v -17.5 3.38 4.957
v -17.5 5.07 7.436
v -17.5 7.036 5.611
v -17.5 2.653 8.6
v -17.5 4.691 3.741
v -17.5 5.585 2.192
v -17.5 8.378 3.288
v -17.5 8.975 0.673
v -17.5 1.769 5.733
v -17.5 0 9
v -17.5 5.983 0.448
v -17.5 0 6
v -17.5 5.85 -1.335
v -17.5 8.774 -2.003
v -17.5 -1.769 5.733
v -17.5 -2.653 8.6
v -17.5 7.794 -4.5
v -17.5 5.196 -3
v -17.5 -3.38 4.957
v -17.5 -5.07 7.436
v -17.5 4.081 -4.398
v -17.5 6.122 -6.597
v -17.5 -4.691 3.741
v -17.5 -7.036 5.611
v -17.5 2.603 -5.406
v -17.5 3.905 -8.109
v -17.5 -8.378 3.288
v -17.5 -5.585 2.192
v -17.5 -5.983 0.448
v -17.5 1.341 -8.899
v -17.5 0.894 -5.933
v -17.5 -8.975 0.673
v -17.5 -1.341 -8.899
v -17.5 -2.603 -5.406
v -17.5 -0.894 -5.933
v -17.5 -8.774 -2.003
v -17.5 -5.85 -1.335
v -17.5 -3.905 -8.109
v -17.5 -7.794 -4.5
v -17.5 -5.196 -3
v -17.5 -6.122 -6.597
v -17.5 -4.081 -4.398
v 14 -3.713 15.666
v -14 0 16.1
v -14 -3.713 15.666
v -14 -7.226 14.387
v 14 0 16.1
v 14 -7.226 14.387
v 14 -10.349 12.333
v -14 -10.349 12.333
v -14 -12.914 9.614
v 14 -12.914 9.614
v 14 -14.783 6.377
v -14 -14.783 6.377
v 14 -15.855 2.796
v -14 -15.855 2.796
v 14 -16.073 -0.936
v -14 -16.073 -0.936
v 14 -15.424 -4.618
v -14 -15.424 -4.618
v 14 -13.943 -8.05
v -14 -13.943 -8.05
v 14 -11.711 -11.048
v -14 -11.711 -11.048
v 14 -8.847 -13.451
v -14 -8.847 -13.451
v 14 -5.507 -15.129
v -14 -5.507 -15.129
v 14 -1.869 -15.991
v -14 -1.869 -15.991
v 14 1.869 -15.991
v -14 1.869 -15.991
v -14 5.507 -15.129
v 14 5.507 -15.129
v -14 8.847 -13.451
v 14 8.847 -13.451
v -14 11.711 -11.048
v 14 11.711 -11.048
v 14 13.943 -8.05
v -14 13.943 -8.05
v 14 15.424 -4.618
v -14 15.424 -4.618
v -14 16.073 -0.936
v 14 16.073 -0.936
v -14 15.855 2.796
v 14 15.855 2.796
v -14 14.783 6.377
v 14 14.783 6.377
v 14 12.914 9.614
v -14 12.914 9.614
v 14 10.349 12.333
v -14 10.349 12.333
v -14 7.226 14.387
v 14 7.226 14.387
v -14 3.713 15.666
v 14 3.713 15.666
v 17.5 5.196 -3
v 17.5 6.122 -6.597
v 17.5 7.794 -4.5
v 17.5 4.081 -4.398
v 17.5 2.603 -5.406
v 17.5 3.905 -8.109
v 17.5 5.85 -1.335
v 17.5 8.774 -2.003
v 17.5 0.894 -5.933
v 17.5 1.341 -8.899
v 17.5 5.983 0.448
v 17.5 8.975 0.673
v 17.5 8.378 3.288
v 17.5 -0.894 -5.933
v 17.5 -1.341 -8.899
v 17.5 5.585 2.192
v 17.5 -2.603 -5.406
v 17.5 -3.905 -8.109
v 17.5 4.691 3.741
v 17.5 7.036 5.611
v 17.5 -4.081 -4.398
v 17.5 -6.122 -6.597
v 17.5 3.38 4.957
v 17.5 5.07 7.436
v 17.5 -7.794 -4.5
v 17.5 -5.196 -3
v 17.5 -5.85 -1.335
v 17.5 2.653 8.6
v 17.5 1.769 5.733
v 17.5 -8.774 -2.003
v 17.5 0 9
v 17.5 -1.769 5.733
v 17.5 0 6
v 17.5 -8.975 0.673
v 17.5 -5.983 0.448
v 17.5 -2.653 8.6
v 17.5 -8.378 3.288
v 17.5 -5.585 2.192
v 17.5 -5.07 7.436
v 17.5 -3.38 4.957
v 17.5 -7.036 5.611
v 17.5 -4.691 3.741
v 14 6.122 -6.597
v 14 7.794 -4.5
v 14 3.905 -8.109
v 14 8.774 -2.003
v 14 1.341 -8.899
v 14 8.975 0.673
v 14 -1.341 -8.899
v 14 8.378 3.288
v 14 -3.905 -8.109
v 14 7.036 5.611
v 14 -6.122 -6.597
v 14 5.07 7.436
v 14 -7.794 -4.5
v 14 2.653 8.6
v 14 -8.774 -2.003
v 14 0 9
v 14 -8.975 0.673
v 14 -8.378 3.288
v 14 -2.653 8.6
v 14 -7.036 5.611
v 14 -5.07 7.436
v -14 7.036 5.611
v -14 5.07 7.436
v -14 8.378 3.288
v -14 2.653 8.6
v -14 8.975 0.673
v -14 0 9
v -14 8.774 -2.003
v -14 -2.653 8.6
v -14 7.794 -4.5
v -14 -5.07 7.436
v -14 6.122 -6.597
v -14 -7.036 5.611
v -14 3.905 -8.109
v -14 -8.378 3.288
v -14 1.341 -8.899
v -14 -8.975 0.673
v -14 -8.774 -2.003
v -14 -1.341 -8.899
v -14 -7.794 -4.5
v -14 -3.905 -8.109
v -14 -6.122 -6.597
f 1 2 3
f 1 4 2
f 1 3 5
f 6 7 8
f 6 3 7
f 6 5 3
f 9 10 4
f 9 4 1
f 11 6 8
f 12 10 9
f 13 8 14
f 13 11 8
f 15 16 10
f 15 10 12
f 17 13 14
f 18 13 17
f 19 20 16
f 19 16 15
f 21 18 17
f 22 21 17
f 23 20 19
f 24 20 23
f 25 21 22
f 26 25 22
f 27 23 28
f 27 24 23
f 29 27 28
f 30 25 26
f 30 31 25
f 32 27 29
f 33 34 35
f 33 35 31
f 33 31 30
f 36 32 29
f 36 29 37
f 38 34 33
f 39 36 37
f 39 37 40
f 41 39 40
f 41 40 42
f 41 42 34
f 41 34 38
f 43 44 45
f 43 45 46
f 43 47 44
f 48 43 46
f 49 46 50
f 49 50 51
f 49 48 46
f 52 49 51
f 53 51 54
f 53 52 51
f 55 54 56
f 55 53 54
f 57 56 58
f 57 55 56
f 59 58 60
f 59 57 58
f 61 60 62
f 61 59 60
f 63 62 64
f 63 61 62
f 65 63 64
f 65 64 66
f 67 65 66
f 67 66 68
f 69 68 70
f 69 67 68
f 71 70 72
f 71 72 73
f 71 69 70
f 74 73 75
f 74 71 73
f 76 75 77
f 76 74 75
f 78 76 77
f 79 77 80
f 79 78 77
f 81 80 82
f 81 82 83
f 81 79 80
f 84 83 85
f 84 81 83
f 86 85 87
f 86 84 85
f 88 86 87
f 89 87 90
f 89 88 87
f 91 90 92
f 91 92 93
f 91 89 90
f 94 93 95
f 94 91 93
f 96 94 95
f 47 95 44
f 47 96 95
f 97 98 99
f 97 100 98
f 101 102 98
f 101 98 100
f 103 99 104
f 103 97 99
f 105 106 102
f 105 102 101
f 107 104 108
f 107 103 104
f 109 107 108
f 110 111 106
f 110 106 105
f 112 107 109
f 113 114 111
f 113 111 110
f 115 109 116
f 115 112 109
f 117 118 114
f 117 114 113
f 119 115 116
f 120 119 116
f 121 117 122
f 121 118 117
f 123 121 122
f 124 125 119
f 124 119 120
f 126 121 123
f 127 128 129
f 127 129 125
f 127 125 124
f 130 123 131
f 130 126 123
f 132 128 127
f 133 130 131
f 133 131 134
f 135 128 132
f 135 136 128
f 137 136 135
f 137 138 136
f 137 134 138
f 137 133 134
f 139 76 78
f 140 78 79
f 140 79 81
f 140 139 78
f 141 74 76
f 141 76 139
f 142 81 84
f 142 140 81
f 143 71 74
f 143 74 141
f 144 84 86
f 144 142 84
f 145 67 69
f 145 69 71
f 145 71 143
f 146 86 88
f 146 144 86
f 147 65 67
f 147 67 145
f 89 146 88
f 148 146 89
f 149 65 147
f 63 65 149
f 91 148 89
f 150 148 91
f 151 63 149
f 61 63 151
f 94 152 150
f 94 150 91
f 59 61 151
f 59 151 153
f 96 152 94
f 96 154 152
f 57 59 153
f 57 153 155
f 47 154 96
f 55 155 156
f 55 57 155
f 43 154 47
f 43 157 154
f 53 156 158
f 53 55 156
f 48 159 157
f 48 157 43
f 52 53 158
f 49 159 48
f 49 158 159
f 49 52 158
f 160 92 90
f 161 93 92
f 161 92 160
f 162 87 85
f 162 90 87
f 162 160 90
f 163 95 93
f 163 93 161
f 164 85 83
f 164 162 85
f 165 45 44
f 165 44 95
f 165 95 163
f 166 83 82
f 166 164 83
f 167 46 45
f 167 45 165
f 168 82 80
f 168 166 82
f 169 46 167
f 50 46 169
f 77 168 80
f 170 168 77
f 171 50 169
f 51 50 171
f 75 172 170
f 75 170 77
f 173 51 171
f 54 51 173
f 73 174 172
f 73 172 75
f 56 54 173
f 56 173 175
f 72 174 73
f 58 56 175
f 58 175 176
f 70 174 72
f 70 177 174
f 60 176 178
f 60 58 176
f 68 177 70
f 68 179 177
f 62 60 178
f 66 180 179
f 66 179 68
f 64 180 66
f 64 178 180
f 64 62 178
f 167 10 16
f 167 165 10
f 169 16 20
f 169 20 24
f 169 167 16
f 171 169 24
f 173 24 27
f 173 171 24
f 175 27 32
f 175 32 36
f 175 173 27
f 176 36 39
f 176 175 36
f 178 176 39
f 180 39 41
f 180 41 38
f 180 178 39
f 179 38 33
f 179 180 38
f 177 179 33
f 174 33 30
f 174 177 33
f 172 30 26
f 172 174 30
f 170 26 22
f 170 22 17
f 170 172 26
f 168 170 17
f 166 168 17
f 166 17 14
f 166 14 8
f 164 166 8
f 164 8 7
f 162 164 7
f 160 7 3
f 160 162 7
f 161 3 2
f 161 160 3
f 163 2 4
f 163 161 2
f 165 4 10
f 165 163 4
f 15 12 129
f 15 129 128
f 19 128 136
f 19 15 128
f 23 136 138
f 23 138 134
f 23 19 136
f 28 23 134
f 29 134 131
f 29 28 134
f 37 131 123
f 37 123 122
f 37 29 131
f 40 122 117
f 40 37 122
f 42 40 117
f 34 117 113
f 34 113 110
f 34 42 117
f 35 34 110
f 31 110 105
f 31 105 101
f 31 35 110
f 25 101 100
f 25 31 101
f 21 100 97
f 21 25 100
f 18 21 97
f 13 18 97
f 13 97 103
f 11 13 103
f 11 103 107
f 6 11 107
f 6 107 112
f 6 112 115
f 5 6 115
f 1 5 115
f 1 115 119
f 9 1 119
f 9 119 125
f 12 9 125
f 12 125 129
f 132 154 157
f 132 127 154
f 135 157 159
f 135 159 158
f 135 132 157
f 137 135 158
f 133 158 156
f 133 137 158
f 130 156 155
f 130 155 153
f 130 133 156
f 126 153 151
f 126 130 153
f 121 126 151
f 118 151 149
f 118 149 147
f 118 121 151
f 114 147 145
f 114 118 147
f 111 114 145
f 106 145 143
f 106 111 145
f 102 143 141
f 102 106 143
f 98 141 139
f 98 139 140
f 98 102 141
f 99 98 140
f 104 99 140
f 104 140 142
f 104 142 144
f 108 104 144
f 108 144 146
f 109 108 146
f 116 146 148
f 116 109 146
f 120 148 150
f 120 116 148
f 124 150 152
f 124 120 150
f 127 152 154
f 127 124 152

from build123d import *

# Parameters (mm, degrees)
SZKIC2_R                   = 6
WYTNIJ_WYCI_GNI_CIE1_DEPTH = 28


with BuildPart() as part:
    # Szkic1 → Obrót1 (revolve)
    with BuildSketch(Plane(origin=(0, 0, 0), x_dir=(1, 0, 0), z_dir=(0, 1, 0)), mode=Mode.PRIVATE) as obr_t1_sk:
        Polygon((-14, 6), (-17.5, 6), (-17.5, 9), (-14, 9), (-14, 16.1), (14, 16.1), (14, 9), (17.5, 9), (17.5, 6), (14, 6), (14, 0), (-14, 0), align=None)
    revolve(obr_t1_sk.sketch.rotate(Axis((-14, 0, 0), (1, 0, 0)), 180), axis=Axis((-14, 0, 0), (1, 0, 0)))

    # Szkic2 → Wytnij-wyciągnięcie1 (cut)
    with BuildSketch(Plane.ZY.offset(14)):
        Circle(SZKIC2_R)
    extrude(amount=-WYTNIJ_WYCI_GNI_CIE1_DEPTH, mode=Mode.SUBTRACT)


solid = part.part
